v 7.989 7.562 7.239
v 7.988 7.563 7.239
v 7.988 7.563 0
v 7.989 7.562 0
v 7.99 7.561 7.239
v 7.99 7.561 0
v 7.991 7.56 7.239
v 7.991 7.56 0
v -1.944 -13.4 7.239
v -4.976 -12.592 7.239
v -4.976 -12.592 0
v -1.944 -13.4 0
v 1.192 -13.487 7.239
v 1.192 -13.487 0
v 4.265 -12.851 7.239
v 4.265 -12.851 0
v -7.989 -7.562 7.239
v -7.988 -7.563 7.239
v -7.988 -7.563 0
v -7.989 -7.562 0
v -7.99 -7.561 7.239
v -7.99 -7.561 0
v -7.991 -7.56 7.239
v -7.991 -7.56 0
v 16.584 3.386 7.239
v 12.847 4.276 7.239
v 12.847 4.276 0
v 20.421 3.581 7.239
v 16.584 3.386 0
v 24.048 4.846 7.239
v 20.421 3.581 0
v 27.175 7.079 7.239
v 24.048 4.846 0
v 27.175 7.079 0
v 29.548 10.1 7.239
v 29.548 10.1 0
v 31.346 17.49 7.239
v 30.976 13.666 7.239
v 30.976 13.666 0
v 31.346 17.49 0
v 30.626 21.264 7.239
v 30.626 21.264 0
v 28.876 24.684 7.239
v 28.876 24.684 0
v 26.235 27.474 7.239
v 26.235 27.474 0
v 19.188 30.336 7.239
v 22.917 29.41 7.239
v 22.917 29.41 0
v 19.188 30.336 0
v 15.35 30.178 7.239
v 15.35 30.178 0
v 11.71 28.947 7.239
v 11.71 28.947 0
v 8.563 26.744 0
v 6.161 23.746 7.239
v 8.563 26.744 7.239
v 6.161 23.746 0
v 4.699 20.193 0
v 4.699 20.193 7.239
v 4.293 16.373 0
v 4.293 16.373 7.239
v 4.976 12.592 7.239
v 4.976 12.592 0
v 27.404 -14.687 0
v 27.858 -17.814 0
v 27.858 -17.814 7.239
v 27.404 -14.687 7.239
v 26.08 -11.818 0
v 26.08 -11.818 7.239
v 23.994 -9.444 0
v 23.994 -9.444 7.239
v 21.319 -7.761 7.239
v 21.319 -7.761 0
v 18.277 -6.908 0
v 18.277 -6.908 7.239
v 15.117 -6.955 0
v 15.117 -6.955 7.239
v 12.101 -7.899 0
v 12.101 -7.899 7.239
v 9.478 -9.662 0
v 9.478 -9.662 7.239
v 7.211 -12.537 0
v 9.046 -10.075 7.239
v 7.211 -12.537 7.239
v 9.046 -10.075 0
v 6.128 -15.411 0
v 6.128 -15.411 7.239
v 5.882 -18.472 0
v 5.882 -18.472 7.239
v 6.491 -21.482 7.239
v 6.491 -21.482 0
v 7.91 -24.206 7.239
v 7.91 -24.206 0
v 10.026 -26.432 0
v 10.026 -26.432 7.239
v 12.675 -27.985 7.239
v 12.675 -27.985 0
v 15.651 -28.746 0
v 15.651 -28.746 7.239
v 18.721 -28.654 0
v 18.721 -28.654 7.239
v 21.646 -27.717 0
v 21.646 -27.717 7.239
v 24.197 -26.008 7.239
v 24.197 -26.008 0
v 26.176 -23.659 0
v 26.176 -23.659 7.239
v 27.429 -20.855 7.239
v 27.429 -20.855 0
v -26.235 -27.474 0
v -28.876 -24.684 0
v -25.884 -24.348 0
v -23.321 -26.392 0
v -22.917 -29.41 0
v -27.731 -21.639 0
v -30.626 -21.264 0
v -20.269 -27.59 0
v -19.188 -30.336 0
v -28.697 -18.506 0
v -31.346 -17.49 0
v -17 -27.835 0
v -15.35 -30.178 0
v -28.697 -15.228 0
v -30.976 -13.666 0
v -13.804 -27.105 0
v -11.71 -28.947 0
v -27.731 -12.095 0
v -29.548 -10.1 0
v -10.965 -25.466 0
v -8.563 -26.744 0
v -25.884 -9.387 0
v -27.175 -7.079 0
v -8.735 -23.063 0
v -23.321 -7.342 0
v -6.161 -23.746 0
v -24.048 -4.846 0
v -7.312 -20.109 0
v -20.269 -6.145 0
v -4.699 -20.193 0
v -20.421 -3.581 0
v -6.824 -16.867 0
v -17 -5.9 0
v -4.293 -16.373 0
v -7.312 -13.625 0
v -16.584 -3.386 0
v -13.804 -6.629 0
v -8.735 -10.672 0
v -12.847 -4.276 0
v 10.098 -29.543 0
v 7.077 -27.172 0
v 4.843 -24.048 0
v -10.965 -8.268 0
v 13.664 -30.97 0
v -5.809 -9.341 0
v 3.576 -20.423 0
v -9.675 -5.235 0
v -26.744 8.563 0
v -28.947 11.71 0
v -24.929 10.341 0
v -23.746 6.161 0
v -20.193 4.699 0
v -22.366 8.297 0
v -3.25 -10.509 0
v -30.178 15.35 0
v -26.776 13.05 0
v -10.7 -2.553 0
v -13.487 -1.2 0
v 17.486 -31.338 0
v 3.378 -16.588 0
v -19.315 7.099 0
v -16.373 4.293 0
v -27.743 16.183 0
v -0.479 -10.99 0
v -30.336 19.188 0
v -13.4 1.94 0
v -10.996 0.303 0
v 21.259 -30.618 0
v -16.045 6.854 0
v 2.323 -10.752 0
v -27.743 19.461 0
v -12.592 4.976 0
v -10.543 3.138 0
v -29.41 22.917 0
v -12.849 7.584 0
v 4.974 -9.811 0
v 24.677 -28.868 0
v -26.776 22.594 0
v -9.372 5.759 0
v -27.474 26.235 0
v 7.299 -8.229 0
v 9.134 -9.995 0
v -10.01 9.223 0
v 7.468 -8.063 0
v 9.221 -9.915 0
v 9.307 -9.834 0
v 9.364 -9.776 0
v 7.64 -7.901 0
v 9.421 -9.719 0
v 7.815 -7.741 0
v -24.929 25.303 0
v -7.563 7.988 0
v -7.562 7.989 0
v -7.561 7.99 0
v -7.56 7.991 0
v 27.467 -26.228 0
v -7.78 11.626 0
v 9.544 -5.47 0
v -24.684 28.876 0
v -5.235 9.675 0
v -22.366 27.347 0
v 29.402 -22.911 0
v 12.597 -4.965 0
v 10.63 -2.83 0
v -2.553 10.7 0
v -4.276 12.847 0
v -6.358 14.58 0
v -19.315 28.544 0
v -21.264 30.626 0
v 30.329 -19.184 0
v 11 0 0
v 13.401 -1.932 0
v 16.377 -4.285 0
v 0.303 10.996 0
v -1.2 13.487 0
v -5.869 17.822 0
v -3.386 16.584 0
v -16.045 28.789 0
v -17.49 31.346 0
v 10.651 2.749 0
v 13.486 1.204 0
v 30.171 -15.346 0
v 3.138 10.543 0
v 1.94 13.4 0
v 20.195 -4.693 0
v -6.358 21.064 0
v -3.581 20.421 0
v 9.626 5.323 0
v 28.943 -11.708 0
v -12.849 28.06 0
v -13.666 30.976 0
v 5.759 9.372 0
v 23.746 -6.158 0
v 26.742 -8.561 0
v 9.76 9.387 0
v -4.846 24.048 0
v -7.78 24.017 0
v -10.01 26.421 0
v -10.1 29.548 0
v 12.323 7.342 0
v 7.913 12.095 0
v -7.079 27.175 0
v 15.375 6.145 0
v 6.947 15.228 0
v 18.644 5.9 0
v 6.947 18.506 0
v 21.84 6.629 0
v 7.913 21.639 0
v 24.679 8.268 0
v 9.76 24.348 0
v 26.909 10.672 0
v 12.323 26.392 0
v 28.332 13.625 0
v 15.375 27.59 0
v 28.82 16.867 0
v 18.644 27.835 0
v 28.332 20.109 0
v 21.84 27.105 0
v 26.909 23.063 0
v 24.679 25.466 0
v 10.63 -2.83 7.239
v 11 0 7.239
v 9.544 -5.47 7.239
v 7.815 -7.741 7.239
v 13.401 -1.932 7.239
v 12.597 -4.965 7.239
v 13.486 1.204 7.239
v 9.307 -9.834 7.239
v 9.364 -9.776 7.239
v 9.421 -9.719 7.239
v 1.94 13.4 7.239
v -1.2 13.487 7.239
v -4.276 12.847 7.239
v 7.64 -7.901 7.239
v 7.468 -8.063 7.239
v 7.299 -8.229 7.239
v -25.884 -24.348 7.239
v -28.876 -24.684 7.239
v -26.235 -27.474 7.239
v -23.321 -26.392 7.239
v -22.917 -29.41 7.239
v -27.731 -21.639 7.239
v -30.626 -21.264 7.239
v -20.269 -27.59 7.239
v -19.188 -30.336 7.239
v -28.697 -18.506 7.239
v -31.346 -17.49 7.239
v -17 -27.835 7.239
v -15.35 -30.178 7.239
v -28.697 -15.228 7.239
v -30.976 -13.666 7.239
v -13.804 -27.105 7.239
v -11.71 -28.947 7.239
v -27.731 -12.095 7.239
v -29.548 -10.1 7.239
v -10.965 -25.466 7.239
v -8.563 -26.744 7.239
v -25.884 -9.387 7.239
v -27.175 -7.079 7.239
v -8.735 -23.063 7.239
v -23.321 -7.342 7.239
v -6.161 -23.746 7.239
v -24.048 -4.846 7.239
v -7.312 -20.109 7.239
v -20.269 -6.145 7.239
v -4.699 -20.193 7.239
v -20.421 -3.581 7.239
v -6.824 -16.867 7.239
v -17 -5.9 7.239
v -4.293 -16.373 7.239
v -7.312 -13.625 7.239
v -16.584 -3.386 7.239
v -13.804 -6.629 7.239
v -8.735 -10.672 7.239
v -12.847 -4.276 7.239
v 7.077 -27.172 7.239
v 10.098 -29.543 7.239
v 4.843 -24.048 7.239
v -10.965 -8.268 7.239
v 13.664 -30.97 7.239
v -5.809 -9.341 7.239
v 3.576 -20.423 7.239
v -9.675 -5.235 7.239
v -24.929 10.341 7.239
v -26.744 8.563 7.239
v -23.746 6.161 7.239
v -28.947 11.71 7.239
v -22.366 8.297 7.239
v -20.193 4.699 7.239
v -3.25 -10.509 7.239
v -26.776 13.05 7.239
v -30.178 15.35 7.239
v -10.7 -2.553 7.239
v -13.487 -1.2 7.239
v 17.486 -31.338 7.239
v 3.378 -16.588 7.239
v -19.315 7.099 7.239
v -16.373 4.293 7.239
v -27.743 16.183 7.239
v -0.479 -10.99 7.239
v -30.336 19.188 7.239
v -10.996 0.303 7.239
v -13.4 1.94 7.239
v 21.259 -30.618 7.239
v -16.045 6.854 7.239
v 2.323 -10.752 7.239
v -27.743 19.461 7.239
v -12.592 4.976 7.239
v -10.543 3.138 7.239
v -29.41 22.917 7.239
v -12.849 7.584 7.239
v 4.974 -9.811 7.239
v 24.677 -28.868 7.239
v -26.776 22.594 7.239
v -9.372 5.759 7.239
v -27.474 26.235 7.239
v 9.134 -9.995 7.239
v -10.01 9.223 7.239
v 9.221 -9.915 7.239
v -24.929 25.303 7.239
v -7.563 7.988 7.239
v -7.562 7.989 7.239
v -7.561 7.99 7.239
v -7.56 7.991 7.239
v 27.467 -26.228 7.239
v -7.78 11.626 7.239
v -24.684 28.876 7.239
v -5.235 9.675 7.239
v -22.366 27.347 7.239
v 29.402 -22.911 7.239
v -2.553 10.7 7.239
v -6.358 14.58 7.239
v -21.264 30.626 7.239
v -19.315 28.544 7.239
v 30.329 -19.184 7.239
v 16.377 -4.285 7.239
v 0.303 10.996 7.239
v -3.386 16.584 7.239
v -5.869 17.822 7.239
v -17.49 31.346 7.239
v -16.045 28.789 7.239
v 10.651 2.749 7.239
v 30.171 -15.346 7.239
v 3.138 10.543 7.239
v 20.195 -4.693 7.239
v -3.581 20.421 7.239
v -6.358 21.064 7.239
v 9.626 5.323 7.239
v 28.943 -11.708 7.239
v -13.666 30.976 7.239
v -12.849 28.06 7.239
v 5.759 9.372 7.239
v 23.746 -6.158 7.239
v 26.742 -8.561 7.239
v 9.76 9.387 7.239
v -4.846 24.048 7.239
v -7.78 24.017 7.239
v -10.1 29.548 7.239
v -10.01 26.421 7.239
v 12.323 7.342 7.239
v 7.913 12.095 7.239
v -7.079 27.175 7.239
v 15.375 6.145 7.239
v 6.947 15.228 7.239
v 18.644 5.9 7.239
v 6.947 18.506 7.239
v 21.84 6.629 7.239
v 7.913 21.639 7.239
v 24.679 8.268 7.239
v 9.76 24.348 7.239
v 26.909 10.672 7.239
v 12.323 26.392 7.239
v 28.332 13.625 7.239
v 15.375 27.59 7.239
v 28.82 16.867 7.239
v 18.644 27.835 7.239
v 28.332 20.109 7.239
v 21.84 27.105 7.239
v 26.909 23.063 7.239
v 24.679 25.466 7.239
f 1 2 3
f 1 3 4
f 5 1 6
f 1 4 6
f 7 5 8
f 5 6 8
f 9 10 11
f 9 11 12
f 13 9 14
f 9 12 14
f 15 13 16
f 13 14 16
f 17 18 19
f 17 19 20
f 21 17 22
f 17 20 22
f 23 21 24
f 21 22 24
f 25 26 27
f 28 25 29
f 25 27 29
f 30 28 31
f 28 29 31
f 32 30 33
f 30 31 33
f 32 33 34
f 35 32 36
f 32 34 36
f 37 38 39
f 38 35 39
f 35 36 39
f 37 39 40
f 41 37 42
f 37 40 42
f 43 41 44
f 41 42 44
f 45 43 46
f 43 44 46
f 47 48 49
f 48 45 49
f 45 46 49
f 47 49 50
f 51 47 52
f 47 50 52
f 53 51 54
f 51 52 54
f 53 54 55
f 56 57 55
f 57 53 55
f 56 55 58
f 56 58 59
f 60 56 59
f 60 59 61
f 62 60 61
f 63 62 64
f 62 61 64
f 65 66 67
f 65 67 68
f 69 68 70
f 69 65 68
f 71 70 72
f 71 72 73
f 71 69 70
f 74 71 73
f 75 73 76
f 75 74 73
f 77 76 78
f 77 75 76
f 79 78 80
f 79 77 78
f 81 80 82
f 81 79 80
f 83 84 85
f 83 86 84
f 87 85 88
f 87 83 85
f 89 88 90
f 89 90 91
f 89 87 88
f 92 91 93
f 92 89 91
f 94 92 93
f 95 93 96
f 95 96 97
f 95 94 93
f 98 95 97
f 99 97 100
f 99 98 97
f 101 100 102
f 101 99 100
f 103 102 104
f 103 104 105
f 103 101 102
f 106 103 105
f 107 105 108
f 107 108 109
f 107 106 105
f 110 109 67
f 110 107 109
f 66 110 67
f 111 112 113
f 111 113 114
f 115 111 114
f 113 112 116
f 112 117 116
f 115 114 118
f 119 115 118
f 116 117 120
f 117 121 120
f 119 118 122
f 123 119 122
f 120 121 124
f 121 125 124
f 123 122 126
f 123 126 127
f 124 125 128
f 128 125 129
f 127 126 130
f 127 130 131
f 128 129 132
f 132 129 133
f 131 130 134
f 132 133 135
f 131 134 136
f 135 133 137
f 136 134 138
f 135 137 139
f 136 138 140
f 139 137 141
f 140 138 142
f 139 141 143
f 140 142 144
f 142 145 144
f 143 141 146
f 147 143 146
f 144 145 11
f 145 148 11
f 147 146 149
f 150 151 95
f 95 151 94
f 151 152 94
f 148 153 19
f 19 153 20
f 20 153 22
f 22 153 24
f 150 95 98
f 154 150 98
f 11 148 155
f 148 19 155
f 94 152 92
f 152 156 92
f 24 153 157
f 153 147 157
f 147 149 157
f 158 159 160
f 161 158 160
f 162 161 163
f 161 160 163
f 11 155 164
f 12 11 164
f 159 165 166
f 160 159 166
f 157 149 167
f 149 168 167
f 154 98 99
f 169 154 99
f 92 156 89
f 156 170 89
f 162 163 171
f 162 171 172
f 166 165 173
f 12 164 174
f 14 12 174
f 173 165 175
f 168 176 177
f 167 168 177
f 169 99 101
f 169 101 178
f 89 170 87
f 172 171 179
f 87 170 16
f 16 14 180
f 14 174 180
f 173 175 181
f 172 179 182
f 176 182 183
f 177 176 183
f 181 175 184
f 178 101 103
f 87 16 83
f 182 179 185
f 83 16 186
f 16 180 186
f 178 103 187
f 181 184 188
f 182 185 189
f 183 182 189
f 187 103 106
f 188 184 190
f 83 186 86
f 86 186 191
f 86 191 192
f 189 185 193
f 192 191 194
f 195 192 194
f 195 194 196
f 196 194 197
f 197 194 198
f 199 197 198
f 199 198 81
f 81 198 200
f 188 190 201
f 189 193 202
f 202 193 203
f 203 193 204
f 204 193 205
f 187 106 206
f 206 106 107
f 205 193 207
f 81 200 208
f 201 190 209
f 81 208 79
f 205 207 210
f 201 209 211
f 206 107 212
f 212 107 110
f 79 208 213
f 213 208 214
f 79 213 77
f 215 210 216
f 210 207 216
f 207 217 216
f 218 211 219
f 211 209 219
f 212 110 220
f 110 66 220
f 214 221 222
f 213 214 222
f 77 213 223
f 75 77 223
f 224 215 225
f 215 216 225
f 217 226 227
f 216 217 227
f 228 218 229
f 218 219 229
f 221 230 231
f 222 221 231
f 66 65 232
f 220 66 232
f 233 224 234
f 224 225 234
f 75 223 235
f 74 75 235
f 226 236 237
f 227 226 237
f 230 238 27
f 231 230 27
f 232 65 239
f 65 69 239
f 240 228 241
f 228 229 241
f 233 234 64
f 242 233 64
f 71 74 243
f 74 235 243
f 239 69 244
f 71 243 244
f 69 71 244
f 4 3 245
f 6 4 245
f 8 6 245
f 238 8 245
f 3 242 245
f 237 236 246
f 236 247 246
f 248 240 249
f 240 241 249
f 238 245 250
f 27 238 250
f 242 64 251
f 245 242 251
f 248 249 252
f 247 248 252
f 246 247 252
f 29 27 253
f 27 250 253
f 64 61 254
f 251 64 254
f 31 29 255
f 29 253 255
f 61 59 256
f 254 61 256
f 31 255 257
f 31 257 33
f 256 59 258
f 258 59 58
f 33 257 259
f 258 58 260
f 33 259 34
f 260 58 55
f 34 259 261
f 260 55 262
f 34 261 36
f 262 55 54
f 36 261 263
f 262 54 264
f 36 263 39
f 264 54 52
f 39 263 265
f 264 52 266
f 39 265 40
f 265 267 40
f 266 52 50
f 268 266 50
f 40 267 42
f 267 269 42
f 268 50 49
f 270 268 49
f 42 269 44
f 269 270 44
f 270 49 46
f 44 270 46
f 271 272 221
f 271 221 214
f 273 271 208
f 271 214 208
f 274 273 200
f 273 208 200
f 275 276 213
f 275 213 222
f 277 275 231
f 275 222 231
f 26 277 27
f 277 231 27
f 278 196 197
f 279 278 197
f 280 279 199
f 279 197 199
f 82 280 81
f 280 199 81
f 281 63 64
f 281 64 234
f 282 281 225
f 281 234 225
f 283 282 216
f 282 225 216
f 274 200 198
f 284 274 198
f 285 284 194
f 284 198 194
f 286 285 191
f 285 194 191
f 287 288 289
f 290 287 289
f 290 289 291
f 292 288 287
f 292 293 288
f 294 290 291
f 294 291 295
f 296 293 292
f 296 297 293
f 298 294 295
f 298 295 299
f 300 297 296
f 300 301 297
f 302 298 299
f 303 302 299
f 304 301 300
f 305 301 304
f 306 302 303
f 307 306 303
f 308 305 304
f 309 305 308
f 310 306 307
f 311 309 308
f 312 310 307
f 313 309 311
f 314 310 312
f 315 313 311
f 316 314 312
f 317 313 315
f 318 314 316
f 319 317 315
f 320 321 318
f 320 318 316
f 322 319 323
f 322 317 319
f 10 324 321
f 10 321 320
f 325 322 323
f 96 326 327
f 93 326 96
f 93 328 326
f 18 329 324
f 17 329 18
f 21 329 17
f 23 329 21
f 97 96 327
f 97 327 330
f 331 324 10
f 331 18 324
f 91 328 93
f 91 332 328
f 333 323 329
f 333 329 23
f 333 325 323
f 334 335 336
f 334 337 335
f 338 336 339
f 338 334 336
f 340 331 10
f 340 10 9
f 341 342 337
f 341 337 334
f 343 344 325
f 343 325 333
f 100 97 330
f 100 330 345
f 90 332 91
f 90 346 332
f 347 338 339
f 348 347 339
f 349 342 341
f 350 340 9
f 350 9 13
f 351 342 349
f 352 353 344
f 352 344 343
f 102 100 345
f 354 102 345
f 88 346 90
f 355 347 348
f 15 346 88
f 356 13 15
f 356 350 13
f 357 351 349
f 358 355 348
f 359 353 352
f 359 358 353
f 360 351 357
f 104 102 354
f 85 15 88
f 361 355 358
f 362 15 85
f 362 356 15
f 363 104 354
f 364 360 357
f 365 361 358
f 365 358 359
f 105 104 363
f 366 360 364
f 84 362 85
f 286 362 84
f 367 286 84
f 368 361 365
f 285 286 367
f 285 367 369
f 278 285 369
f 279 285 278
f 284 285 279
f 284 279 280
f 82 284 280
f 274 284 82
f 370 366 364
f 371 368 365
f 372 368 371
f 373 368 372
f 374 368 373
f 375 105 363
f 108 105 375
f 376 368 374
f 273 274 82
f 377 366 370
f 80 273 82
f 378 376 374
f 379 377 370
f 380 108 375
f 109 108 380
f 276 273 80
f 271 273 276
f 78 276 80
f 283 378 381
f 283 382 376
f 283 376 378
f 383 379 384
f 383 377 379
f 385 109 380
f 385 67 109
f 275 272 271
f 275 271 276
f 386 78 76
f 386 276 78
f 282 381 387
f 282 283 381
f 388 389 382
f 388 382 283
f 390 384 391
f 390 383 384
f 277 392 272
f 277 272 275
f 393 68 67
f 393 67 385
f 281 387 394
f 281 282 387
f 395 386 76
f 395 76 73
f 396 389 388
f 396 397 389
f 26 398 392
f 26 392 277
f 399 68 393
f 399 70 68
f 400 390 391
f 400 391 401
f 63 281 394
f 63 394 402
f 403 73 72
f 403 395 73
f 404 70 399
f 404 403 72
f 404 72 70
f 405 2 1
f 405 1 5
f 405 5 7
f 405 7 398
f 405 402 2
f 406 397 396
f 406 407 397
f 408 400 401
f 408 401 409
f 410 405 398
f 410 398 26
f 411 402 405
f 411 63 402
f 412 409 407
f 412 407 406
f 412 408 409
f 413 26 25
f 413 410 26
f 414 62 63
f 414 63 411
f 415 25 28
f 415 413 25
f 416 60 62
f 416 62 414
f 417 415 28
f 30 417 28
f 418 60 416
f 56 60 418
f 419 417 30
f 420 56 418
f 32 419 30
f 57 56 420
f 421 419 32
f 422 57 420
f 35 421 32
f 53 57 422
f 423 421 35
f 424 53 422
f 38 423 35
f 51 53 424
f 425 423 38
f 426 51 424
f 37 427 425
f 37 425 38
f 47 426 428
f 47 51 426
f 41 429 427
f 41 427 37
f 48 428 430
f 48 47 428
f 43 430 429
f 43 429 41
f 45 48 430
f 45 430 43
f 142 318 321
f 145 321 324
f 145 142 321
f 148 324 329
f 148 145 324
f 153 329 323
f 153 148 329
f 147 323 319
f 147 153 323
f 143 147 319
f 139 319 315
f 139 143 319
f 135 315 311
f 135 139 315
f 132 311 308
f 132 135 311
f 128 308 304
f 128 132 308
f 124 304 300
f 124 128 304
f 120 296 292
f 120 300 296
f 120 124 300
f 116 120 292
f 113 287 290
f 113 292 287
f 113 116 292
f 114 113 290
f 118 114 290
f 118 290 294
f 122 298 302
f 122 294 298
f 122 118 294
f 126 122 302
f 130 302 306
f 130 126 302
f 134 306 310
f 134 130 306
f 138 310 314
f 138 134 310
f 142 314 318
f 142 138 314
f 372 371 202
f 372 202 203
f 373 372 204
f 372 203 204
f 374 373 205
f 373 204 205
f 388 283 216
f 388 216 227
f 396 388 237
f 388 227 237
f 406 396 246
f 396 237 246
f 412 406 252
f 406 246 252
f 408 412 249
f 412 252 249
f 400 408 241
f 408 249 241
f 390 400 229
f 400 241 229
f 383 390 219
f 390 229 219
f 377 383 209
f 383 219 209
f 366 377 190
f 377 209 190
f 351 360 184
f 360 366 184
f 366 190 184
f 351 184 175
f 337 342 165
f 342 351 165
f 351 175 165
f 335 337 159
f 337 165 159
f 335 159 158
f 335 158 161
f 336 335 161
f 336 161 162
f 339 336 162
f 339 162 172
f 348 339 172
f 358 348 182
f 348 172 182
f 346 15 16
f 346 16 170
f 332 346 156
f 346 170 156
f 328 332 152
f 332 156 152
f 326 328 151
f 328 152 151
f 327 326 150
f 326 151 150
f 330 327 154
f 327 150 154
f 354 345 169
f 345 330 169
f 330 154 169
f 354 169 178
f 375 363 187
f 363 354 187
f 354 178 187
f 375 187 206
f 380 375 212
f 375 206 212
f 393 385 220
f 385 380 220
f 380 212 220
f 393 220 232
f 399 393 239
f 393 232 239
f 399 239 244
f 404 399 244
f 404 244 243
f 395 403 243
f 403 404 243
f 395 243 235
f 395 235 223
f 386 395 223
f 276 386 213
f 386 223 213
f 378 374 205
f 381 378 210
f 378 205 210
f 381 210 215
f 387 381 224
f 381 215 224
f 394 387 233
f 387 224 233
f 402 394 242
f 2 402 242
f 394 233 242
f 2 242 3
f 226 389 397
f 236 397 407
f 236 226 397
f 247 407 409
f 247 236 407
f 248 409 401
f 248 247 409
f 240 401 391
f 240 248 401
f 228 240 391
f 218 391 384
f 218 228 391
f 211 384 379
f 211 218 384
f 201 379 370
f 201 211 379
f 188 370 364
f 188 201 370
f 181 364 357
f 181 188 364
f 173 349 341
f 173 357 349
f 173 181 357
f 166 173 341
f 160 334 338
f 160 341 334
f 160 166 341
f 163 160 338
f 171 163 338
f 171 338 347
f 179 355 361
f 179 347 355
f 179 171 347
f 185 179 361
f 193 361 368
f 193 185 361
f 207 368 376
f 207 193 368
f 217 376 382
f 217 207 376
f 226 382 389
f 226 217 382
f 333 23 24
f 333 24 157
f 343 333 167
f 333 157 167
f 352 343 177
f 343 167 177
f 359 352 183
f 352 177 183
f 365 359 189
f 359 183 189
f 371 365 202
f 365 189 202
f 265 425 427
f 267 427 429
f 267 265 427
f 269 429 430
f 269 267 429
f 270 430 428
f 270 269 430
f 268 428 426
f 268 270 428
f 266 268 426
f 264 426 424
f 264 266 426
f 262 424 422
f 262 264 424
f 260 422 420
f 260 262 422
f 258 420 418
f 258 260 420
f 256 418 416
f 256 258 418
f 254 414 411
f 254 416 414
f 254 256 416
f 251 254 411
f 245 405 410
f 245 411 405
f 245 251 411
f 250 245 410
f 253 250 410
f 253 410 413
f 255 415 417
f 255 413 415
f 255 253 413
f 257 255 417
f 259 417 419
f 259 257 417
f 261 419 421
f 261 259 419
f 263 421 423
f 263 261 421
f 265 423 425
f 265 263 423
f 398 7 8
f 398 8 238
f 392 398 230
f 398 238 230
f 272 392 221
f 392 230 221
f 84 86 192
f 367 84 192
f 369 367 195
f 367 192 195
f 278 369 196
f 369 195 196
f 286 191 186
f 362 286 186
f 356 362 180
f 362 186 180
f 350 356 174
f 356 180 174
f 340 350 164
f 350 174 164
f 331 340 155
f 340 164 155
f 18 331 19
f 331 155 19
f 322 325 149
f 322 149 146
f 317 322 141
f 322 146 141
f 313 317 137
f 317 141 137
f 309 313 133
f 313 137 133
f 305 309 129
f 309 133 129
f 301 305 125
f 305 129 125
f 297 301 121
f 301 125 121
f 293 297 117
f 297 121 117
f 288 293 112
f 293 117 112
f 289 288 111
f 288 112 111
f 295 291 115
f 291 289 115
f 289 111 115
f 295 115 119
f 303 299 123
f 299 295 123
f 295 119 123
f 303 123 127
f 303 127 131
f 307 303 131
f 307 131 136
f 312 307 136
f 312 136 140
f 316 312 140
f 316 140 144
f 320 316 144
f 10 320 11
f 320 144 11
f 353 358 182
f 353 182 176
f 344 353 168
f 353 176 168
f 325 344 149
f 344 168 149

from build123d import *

# Parameters (mm, degrees)
F5_DEPTH = 7.239
F1_R     = 13.5382
F1_R_2   = 10.9982
F6_DEPTH = 7.239
F2_R     = 13.5382
F2_R_2   = 10.9982
F7_DEPTH = 7.239
F3_R     = 13.5382
F3_R_2   = 10.9982
F8_DEPTH = 7.239
F4_R     = 13.5382
F4_R_2   = 10.9982
F9_DEPTH = 7.239


with BuildPart() as f5:
    # F0 (on Top) → F5 (new body)
    with BuildSketch(Plane.XY):
        with BuildLine():
            ThreePointArc((7.98923, 7.561236), (10.219629, 4.069307), (11.000003, 0))
            ThreePointArc((11.000003, 0), (10.103804, -4.348934), (7.561236, -7.98923))
            Line((7.561236, -7.98923), (9.307193, -9.834015))
            ThreePointArc((9.307193, -9.834015), (9.478103, -9.661638), (9.653725, -9.494066))
            ThreePointArc((9.653725, -9.494066), (13.539381, -0.129832), (9.834015, 9.307193))
            Line((9.834015, 9.307193), (7.98923, 7.561236))
        make_face()
        with BuildLine():
            ThreePointArc((-7.561236, 7.98923), (0.302638, 10.995839), (7.98923, 7.561236))
            Line((7.98923, 7.561236), (9.834015, 9.307193))
            ThreePointArc((9.834015, 9.307193), (0.372519, 13.534878), (-9.307193, 9.834015))
            Line((-9.307193, 9.834015), (-7.561236, 7.98923))
        make_face()
        with BuildLine():
            Line((9.307193, -9.834015), (7.561236, -7.98923))
            ThreePointArc((7.561236, -7.98923), (-0.302638, -10.995839), (-7.98923, -7.561236))
            Line((-7.98923, -7.561236), (-9.834015, -9.307193))
            ThreePointArc((-9.834015, -9.307193), (-0.372519, -13.534878), (9.307193, -9.834015))
        make_face()
        with BuildLine():
            ThreePointArc((-7.98923, -7.561236), (-10.995839, 0.302638), (-7.561236, 7.98923))
            Line((-7.561236, 7.98923), (-9.307193, 9.834015))
            ThreePointArc((-9.307193, 9.834015), (-13.534878, 0.372519), (-9.834015, -9.307193))
            Line((-9.834015, -9.307193), (-7.98923, -7.561236))
        make_face()
    extrude(amount=F5_DEPTH)

    # F1 (on Top) → F6 (join)
    with BuildSketch(Plane.XY):
        with Locations((16.860046, -17.814388)):
            Circle(F1_R)
        with Locations((16.860046, -17.814388)):
            Circle(F1_R_2, mode=Mode.SUBTRACT)
    extrude(amount=F6_DEPTH)

    # F2 (on Top) → F7 (join)
    with BuildSketch(Plane.XY):
        with Locations((-17.821935, -16.867189)):
            Circle(F2_R)
        with Locations((-17.821935, -16.867189)):
            Circle(F2_R_2, mode=Mode.SUBTRACT)
    extrude(amount=F7_DEPTH)

    # F3 (on Top) → F8 (join)
    with BuildSketch(Plane.XY):
        with Locations((-16.867189, 17.821935)):
            Circle(F3_R)
        with Locations((-16.867189, 17.821935)):
            Circle(F3_R_2, mode=Mode.SUBTRACT)
    extrude(amount=F8_DEPTH)

    # F4 (on Top) → F9 (join)
    with BuildSketch(Plane.XY):
        with Locations((17.821935, 16.867189)):
            Circle(F4_R)
        with Locations((17.821935, 16.867189)):
            Circle(F4_R_2, mode=Mode.SUBTRACT)
    extrude(amount=F9_DEPTH)


solid = f5.part
